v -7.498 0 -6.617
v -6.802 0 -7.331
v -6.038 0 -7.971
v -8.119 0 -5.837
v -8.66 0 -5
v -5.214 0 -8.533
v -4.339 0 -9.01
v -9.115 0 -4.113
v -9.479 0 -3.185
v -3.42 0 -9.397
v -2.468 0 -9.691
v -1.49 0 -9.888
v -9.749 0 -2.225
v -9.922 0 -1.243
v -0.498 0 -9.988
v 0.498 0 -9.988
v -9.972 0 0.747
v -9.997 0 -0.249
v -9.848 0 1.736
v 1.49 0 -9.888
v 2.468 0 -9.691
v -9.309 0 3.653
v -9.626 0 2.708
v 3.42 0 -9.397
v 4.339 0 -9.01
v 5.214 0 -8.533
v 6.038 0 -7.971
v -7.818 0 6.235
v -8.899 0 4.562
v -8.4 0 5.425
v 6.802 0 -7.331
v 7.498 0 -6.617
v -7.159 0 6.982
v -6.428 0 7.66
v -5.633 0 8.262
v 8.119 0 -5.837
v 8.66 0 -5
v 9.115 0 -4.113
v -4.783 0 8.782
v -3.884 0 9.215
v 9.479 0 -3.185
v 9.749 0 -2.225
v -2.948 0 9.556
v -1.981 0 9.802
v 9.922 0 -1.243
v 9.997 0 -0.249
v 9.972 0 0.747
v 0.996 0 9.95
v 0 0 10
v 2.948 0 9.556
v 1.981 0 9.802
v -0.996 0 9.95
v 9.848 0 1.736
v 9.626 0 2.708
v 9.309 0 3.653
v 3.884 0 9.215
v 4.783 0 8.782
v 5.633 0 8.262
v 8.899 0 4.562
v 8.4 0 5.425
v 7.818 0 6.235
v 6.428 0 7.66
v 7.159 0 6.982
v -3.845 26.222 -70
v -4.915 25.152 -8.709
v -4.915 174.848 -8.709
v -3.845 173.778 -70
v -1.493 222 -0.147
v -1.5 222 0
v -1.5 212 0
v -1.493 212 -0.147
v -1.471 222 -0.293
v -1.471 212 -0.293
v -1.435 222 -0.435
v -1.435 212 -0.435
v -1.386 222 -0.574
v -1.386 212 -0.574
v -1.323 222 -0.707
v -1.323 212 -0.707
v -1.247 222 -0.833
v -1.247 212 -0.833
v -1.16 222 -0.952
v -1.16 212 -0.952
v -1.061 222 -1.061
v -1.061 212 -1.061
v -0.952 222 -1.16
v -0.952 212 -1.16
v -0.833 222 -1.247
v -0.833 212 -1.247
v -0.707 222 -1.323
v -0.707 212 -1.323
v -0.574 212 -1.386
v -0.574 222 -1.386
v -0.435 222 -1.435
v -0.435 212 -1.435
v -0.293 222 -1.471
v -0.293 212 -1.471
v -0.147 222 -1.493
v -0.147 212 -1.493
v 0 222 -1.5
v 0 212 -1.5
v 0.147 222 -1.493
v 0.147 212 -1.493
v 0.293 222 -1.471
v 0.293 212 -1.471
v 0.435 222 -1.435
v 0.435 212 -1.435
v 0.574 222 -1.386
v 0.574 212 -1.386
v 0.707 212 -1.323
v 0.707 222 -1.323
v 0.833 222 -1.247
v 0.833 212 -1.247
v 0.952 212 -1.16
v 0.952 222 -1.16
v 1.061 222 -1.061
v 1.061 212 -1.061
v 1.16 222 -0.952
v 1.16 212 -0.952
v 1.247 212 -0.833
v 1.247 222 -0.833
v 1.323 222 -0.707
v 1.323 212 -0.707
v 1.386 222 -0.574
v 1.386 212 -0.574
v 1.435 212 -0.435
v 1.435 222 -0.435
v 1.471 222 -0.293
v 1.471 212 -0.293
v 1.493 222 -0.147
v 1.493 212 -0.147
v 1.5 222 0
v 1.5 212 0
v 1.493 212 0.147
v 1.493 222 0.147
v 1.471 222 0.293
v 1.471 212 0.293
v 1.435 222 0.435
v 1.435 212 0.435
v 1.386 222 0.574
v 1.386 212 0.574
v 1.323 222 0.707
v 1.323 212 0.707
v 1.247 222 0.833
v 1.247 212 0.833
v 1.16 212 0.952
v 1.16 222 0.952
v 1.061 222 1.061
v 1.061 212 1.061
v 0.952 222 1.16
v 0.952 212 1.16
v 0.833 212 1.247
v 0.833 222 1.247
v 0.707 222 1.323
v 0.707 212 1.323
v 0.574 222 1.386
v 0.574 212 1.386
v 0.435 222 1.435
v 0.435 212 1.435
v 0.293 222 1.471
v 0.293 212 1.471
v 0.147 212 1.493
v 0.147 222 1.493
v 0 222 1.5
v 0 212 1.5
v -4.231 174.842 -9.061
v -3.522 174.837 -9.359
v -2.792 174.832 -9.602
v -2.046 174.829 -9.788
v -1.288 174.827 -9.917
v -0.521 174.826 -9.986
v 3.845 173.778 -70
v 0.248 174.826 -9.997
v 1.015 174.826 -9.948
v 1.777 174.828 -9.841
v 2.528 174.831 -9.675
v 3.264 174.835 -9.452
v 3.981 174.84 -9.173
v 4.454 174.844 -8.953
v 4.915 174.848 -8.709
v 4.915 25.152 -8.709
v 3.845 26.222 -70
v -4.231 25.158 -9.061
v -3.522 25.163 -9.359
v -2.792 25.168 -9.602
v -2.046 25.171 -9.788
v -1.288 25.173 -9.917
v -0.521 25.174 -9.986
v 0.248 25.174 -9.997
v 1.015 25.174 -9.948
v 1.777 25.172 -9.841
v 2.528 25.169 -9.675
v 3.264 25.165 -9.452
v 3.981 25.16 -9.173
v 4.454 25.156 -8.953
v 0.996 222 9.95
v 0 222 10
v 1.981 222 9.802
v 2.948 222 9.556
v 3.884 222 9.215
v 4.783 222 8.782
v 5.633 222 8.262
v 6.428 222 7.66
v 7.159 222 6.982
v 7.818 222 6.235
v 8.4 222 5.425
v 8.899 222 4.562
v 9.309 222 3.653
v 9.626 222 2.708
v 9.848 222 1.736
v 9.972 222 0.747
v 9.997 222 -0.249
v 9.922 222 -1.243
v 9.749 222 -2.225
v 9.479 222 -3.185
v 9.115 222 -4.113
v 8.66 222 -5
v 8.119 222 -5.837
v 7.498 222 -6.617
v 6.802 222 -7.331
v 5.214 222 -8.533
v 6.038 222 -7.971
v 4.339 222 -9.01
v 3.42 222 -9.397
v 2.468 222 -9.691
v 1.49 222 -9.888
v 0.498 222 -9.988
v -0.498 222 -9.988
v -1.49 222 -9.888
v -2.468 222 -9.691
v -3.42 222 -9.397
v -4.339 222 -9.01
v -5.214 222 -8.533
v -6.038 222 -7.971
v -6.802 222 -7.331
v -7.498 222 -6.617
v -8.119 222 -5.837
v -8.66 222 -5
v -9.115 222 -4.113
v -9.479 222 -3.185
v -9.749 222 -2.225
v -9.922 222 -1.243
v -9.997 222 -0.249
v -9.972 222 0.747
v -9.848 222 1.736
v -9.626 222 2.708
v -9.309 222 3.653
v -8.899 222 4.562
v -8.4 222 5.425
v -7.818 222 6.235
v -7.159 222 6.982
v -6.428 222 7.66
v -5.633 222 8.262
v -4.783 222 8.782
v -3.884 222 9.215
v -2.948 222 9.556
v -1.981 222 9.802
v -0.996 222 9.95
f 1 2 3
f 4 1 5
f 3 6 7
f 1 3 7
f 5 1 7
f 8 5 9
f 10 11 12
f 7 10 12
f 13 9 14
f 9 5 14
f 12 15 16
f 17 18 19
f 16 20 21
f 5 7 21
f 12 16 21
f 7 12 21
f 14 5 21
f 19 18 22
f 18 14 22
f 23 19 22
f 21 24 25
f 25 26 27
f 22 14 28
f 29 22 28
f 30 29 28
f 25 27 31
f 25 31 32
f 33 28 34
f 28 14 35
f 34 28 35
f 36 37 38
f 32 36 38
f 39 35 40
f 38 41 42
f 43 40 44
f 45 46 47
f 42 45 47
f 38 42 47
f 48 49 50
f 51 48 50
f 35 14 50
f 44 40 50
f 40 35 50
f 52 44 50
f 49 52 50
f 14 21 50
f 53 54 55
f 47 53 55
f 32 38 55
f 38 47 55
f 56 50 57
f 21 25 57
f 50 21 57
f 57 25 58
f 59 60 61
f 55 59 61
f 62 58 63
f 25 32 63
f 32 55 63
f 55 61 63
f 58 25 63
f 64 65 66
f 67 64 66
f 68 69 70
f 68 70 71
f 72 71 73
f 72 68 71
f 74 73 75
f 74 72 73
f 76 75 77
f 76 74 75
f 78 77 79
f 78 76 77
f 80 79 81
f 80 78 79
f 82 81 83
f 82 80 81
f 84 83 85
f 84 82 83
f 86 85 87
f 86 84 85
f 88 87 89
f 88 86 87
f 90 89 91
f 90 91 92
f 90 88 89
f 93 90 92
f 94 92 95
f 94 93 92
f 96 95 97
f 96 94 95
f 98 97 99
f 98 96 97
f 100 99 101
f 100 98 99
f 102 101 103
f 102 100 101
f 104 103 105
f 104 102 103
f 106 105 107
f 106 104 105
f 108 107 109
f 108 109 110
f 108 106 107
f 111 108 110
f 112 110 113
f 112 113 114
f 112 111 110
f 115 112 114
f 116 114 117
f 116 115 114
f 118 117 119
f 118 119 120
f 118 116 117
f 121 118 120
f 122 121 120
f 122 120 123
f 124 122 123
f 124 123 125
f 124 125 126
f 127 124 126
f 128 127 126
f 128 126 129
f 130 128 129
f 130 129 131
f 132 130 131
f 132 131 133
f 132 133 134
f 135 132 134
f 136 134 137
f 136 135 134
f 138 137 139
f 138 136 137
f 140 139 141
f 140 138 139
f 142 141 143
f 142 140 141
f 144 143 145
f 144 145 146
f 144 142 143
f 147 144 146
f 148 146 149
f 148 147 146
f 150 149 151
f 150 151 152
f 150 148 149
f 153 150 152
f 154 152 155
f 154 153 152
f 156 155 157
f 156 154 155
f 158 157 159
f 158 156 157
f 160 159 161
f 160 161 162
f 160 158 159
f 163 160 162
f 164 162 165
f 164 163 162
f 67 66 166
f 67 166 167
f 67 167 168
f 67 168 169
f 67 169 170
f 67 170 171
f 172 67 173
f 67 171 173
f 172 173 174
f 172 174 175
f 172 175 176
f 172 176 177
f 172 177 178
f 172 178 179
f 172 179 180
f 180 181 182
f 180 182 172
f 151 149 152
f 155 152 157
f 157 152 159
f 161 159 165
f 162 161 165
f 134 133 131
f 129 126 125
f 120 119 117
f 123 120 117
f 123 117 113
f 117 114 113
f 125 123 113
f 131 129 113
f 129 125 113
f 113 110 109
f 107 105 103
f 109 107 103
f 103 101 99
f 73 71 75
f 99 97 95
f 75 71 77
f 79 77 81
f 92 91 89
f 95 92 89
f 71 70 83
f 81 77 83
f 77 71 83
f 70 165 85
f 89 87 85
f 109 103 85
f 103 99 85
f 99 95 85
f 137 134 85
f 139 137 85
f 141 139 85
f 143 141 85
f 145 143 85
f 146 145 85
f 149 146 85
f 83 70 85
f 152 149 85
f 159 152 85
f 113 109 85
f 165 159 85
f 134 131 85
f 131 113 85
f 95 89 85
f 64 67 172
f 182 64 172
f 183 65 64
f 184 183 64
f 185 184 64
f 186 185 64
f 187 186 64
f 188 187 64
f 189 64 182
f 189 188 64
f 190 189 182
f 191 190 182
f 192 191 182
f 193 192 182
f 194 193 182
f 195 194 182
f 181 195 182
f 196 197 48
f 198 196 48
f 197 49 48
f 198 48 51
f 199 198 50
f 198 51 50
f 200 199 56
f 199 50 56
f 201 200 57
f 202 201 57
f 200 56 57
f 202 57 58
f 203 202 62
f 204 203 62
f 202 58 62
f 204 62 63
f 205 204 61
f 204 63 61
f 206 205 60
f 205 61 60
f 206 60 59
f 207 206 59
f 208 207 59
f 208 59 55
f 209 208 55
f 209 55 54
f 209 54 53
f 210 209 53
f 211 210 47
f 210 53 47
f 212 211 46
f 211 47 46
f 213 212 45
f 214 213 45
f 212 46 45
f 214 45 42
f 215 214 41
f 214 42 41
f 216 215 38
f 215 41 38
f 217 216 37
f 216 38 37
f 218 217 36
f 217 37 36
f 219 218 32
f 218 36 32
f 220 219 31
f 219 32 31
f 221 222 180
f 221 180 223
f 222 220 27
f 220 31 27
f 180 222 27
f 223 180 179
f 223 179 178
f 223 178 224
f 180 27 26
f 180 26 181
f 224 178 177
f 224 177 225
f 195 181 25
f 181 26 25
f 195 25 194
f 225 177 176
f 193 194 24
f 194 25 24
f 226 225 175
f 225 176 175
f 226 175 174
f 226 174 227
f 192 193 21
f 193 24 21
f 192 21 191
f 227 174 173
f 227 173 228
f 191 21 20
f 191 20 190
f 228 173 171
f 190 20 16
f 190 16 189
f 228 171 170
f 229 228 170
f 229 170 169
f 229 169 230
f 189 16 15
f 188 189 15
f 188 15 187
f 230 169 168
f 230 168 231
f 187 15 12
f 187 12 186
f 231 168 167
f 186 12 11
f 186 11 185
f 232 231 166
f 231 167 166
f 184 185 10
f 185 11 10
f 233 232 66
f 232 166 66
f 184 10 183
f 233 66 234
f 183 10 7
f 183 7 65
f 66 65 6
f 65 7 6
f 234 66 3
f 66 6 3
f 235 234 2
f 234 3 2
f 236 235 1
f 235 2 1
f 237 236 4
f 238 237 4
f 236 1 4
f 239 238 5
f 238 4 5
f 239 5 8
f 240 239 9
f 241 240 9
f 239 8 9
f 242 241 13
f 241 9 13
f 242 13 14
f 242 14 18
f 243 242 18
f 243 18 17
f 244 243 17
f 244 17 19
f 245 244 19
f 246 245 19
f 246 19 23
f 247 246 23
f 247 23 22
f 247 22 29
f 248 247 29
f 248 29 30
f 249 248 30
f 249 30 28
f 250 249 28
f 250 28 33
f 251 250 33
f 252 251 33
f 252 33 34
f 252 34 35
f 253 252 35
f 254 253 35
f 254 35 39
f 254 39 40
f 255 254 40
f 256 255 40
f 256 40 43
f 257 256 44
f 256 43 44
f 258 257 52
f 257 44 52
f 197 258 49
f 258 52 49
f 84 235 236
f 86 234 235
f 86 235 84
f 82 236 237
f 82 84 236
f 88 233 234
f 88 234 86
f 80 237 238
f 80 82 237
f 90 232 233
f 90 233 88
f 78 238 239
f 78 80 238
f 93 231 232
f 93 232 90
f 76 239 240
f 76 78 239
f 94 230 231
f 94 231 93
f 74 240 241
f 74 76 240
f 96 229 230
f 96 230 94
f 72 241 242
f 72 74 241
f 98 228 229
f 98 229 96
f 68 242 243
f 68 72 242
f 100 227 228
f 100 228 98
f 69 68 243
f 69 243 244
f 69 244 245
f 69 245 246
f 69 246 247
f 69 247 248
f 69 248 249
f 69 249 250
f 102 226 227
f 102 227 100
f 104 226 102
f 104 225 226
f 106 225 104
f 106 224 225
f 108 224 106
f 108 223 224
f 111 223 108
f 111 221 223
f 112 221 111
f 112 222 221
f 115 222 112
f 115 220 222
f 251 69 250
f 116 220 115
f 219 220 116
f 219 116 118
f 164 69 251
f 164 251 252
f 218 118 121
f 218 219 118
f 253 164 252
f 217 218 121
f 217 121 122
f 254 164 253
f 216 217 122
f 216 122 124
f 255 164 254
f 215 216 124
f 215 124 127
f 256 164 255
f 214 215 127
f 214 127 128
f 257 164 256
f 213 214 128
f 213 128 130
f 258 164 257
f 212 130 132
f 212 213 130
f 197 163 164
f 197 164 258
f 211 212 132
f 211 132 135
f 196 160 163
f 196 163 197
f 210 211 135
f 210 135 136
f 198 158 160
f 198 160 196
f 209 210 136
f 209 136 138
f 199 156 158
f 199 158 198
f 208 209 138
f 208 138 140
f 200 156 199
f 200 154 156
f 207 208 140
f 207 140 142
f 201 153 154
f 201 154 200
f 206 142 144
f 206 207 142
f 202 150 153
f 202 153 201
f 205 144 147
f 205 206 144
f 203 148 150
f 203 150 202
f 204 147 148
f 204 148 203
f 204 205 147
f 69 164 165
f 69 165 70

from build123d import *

# Parameters (mm, degrees)
SKIZZE2_R                       = 10
AUFSATZ_LINEAR_AUSTRAGEN1_DEPTH = 210
SKIZZE7_W                       = 10.134043554
SKIZZE7_H                       = 150
AUFSATZ_LINEAR_AUSTRAGEN2_DEPTH = 70
AUFSATZ_LINEAR_AUSTRAGEN2_DRAFT = -1
SKIZZE8_R                       = 10
AUFSATZ_LINEAR_AUSTRAGEN3_DEPTH = 12
SCHNITT_LINEAR_AUSTRAGEN1_DEPTH = 10


with BuildPart() as part:
    # Skizze2 → Aufsatz-Linear austragen1 (new body)
    with BuildSketch(Plane(origin=(0, 0, 0), x_dir=(1, 0, 0), z_dir=(0, 1, 0))):
        with Locations(Location((0, 0, 0), (0, 0, 270))):
            Circle(SKIZZE2_R)
    extrude(amount=AUFSATZ_LINEAR_AUSTRAGEN1_DEPTH)


with BuildPart() as aufsatz_linear_austragen2_tool:
    # Skizze7 → Aufsatz-Linear austragen2 (with draft: the straight prism first)
    with BuildSketch(Plane.XY):
        with Locations((0, 100)):
            Rectangle(SKIZZE7_W, SKIZZE7_H)
    extrude(amount=-AUFSATZ_LINEAR_AUSTRAGEN2_DEPTH)
    # Aufsatz-Linear austragen2: the draft: its side faces are tilted about the plane it starts from
    aufsatz_linear_austragen2_sides = [aufsatz_linear_austragen2_tool.faces().sort_by_distance(p)[0] for p in [
        (0, 175, -35),
        (-5.067021777, 100, -35),
        (0, 25, -35),
        (5.067021777, 100, -35),
    ]]
    draft(aufsatz_linear_austragen2_sides, Plane.XY, AUFSATZ_LINEAR_AUSTRAGEN2_DRAFT)


with BuildPart() as part_1:
    add(part.part)

    # Aufsatz-Linear austragen2: add aufsatz_linear_austragen2_tool
    add(aufsatz_linear_austragen2_tool.part)

    # Skizze8 → Aufsatz-Linear austragen3 (add)
    with BuildSketch(Plane(origin=(0, 210, 0), x_dir=(1, 0, 0), z_dir=(0, 1, 0))):
        with Locations(Location((0, 0, 0), (0, 0, 270))):
            Circle(SKIZZE8_R)
    extrude(amount=AUFSATZ_LINEAR_AUSTRAGEN3_DEPTH)

    # Skizze9 → Schnitt-Linear austragen1 (cut)
    with BuildSketch(Plane(origin=(0, 222, 0), x_dir=(1, 0, 0), z_dir=(0, 1, 0))):
        with BuildLine():
            Line((0, -1.5), (-1.5, 0))
            ThreePointArc((-1.5, 0), (1.060660172, 1.060660172), (0, -1.5))
        make_face()
    extrude(amount=-SCHNITT_LINEAR_AUSTRAGEN1_DEPTH, mode=Mode.SUBTRACT)


solid = part_1.part
